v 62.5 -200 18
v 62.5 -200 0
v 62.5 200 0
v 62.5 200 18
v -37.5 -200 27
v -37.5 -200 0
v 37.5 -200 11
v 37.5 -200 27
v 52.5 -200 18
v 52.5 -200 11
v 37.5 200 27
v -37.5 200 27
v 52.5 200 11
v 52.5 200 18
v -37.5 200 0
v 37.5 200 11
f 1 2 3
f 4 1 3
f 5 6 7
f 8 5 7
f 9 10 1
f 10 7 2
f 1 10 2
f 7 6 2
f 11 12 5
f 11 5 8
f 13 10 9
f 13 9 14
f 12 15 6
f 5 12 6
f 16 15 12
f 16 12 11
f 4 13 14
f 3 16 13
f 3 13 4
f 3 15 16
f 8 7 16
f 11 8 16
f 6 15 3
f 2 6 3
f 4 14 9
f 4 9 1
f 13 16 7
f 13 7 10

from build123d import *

# Parameters (mm, degrees)
F2_DEPTH = 27
F1_W     = 15
F1_H     = 400
F3_DEPTH = 11
F1_W_2   = 10
F4_DEPTH = 18


# Not quite as in the source:
# - a feature of the source that left no trace in its solid (it failed there, or was rolled back) is left out


with BuildPart() as f2:
    # F1 (on Top) → F2 (new body)
    with BuildSketch(Plane.XY):
        with BuildLine():
            Line((-1.25, 200), (-37.5, 200))
            Line((-37.5, 200), (-37.5, -200))
            Line((-37.5, -200), (37.5, -200))
            Line((37.5, -200), (37.5, 200))
            Line((37.5, 200), (1.25, 200))
            Line((1.25, 200), (1.25, -184.1316527028))
            ThreePointArc((1.25, -184.1316527028), (4.6636895265, -186.2250827824), (6, -190))
            ThreePointArc((6, -190), (-3.7749172176, -194.6636895265), (-1.25, -184.1316527028))
            Line((-1.25, -184.1316527028), (-1.25, 200))
        make_face()
        with BuildLine():
            Line((1.25, 200), (-1.25, 200))
            Line((-1.25, 200), (-1.25, -184.1316527028))
            ThreePointArc((-1.25, -184.1316527028), (0, -184), (1.25, -184.1316527028))
            Line((1.25, -184.1316527028), (1.25, 200))
        make_face()
        with BuildLine():
            ThreePointArc((1.25, -184.1316527028), (0, -184), (-1.25, -184.1316527028))
            ThreePointArc((-1.25, -184.1316527028), (-3.7749172176, -194.6636895265), (6, -190))
            ThreePointArc((6, -190), (4.6636895265, -186.2250827824), (1.25, -184.1316527028))
        make_face()
    extrude(amount=F2_DEPTH)

    # F1 (on Top) → F3 (join)
    with BuildSketch(Plane.XY):
        with Locations((45, 0)):
            Rectangle(F1_W, F1_H)
    extrude(amount=F3_DEPTH)

    # F1 (on Top) → F4 (join)
    with BuildSketch(Plane.XY):
        with Locations((57.5, 0)):
            Rectangle(F1_W_2, F1_H)
    extrude(amount=F4_DEPTH)


solid = f2.part
